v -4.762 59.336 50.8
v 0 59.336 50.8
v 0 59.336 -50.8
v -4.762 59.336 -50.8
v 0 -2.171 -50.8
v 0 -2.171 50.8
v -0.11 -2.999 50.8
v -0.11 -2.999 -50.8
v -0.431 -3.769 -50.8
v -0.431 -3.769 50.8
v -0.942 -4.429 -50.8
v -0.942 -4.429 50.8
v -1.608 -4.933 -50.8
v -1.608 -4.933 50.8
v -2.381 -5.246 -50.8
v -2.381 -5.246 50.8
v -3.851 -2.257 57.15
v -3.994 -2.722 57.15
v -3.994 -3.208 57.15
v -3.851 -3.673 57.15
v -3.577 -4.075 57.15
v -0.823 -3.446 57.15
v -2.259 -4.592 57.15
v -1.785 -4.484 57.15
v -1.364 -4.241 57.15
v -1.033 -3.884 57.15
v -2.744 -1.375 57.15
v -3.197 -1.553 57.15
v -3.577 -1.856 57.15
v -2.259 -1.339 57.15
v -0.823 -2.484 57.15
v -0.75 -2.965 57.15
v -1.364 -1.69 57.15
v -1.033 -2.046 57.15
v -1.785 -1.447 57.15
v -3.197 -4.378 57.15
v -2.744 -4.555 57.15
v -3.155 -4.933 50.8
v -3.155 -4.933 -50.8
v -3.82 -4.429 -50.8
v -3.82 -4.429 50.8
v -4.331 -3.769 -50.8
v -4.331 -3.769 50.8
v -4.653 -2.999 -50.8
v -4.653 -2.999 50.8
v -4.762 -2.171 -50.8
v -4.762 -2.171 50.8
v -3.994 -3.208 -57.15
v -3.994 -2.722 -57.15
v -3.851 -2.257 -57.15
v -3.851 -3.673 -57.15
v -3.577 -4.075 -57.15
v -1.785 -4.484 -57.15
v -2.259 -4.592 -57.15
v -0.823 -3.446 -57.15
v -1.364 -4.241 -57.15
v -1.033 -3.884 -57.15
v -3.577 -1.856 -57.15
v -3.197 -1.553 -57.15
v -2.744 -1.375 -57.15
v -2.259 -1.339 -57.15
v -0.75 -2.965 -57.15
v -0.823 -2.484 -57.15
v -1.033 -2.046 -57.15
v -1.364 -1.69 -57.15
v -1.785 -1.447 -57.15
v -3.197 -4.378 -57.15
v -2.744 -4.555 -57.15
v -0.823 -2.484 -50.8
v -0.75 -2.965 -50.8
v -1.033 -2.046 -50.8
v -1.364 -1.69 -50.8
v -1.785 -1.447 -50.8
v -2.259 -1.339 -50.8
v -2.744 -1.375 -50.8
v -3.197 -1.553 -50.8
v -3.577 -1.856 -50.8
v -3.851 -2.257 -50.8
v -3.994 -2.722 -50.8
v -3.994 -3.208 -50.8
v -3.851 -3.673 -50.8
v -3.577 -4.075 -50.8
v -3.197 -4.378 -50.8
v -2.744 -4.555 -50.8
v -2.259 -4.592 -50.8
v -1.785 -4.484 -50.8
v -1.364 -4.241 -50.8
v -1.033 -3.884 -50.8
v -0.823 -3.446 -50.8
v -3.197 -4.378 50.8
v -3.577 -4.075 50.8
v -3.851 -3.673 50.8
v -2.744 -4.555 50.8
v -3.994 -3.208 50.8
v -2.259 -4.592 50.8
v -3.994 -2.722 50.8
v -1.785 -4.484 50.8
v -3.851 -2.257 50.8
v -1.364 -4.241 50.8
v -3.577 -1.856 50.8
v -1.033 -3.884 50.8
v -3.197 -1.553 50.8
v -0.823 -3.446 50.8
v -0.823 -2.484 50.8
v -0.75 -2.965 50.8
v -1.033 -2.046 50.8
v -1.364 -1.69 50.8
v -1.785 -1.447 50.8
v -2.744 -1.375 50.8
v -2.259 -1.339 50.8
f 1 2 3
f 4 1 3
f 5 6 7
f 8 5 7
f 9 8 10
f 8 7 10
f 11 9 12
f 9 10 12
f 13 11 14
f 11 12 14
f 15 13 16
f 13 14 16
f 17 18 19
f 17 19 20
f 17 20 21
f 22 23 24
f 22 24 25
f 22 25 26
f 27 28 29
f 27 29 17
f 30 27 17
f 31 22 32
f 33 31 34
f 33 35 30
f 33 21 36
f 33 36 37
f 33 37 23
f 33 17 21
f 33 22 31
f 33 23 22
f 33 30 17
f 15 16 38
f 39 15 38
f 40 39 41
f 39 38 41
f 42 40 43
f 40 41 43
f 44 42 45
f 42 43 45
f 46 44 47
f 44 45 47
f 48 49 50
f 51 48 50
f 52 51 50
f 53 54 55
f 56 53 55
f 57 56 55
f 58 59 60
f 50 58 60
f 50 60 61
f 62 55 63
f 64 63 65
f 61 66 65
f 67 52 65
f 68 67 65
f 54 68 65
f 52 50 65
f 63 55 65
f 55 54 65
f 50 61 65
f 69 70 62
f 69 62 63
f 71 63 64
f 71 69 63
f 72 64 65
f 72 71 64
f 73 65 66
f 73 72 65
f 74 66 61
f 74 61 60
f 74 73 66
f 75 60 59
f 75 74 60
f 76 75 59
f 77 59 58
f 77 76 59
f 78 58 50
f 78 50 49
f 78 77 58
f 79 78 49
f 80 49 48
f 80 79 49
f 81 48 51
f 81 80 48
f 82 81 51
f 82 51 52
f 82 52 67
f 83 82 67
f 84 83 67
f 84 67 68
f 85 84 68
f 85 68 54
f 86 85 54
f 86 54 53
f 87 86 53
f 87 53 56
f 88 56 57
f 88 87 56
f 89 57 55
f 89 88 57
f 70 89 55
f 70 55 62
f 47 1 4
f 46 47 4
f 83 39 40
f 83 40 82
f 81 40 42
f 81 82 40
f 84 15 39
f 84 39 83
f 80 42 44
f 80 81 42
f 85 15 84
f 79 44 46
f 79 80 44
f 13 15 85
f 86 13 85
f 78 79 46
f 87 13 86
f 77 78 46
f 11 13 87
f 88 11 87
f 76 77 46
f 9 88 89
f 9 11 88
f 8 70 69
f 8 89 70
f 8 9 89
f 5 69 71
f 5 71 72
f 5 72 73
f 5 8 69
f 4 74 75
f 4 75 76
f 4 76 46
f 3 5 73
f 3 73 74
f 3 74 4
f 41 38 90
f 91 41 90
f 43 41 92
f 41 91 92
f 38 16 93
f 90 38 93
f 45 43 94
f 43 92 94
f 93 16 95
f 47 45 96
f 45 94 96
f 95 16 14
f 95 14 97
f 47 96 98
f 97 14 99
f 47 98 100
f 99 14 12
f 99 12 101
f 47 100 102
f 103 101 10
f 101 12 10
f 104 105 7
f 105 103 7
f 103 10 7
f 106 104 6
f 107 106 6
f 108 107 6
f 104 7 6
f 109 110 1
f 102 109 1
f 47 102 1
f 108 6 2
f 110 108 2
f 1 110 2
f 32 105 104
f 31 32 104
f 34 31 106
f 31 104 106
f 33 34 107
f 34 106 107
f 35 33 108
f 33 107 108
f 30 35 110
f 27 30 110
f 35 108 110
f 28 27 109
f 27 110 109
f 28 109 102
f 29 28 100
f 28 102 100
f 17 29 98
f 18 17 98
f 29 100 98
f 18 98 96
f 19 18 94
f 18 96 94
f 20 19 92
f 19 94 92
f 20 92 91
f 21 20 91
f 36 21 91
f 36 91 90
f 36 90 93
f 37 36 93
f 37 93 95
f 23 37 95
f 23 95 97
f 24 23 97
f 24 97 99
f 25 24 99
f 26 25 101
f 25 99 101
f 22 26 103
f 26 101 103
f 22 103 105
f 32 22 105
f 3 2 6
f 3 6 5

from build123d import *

# Parameters (mm, degrees)
SKETCH1_W           = 101.6
SKETCH1_H           = 64.682803082
BOSS_EXTRUDE1_DEPTH = 4.7625
SKETCH2_R           = 1.631191497
BOSS_EXTRUDE2_DEPTH = 6.35
FILLET2_R           = 3.175


with BuildPart() as part:
    # Sketch1 → Boss-Extrude1 (new body)
    with BuildSketch(Plane(origin=(0, 0, 0), x_dir=(0, 0, -1), z_dir=(1, 0, 0))):
        with Locations((0, 26.994954374)):
            Rectangle(SKETCH1_W, SKETCH1_H)
    extrude(amount=-BOSS_EXTRUDE1_DEPTH)

    # Sketch2 → Boss-Extrude2 (add)
    with BuildSketch(Plane.XY.offset(50.8)):
        with Locations((-2.38125, -2.965197167)):
            Circle(SKETCH2_R)
    boss_extrude2 = extrude(amount=BOSS_EXTRUDE2_DEPTH)

    # Mirror1: Boss-Extrude2 across plane
    add(boss_extrude2.mirror(Plane.XY))

    # Fillet2
    # the kernel refuses this fillet: 3.175 mm, written as the material it takes off along each edge
    with BuildSketch(Plane(origin=(0, -5.346447167, 58.7375), x_dir=(0, 1, 0), z_dir=(0, 0, -1))) as fillet2_piece_1:
        with BuildLine():
            CenterArc((FILLET2_R, -FILLET2_R), FILLET2_R, 90, 90)
            Line((0, -FILLET2_R), (0, 0))
            Line((0, 0), (FILLET2_R, 0))
        make_face()
    extrude(amount=117.475, mode=Mode.SUBTRACT)
    with BuildSketch(Plane(origin=(-4.7625, -5.346447167, 58.7375), x_dir=(0, 1, 0), z_dir=(0, 0, -1))) as fillet2_piece_2:
        with BuildLine():
            CenterArc((FILLET2_R, FILLET2_R), FILLET2_R, 180, 90)
            Line((0, FILLET2_R), (0, 0))
            Line((0, 0), (FILLET2_R, 0))
        make_face()
    extrude(amount=117.475, mode=Mode.SUBTRACT)


solid = part.part
